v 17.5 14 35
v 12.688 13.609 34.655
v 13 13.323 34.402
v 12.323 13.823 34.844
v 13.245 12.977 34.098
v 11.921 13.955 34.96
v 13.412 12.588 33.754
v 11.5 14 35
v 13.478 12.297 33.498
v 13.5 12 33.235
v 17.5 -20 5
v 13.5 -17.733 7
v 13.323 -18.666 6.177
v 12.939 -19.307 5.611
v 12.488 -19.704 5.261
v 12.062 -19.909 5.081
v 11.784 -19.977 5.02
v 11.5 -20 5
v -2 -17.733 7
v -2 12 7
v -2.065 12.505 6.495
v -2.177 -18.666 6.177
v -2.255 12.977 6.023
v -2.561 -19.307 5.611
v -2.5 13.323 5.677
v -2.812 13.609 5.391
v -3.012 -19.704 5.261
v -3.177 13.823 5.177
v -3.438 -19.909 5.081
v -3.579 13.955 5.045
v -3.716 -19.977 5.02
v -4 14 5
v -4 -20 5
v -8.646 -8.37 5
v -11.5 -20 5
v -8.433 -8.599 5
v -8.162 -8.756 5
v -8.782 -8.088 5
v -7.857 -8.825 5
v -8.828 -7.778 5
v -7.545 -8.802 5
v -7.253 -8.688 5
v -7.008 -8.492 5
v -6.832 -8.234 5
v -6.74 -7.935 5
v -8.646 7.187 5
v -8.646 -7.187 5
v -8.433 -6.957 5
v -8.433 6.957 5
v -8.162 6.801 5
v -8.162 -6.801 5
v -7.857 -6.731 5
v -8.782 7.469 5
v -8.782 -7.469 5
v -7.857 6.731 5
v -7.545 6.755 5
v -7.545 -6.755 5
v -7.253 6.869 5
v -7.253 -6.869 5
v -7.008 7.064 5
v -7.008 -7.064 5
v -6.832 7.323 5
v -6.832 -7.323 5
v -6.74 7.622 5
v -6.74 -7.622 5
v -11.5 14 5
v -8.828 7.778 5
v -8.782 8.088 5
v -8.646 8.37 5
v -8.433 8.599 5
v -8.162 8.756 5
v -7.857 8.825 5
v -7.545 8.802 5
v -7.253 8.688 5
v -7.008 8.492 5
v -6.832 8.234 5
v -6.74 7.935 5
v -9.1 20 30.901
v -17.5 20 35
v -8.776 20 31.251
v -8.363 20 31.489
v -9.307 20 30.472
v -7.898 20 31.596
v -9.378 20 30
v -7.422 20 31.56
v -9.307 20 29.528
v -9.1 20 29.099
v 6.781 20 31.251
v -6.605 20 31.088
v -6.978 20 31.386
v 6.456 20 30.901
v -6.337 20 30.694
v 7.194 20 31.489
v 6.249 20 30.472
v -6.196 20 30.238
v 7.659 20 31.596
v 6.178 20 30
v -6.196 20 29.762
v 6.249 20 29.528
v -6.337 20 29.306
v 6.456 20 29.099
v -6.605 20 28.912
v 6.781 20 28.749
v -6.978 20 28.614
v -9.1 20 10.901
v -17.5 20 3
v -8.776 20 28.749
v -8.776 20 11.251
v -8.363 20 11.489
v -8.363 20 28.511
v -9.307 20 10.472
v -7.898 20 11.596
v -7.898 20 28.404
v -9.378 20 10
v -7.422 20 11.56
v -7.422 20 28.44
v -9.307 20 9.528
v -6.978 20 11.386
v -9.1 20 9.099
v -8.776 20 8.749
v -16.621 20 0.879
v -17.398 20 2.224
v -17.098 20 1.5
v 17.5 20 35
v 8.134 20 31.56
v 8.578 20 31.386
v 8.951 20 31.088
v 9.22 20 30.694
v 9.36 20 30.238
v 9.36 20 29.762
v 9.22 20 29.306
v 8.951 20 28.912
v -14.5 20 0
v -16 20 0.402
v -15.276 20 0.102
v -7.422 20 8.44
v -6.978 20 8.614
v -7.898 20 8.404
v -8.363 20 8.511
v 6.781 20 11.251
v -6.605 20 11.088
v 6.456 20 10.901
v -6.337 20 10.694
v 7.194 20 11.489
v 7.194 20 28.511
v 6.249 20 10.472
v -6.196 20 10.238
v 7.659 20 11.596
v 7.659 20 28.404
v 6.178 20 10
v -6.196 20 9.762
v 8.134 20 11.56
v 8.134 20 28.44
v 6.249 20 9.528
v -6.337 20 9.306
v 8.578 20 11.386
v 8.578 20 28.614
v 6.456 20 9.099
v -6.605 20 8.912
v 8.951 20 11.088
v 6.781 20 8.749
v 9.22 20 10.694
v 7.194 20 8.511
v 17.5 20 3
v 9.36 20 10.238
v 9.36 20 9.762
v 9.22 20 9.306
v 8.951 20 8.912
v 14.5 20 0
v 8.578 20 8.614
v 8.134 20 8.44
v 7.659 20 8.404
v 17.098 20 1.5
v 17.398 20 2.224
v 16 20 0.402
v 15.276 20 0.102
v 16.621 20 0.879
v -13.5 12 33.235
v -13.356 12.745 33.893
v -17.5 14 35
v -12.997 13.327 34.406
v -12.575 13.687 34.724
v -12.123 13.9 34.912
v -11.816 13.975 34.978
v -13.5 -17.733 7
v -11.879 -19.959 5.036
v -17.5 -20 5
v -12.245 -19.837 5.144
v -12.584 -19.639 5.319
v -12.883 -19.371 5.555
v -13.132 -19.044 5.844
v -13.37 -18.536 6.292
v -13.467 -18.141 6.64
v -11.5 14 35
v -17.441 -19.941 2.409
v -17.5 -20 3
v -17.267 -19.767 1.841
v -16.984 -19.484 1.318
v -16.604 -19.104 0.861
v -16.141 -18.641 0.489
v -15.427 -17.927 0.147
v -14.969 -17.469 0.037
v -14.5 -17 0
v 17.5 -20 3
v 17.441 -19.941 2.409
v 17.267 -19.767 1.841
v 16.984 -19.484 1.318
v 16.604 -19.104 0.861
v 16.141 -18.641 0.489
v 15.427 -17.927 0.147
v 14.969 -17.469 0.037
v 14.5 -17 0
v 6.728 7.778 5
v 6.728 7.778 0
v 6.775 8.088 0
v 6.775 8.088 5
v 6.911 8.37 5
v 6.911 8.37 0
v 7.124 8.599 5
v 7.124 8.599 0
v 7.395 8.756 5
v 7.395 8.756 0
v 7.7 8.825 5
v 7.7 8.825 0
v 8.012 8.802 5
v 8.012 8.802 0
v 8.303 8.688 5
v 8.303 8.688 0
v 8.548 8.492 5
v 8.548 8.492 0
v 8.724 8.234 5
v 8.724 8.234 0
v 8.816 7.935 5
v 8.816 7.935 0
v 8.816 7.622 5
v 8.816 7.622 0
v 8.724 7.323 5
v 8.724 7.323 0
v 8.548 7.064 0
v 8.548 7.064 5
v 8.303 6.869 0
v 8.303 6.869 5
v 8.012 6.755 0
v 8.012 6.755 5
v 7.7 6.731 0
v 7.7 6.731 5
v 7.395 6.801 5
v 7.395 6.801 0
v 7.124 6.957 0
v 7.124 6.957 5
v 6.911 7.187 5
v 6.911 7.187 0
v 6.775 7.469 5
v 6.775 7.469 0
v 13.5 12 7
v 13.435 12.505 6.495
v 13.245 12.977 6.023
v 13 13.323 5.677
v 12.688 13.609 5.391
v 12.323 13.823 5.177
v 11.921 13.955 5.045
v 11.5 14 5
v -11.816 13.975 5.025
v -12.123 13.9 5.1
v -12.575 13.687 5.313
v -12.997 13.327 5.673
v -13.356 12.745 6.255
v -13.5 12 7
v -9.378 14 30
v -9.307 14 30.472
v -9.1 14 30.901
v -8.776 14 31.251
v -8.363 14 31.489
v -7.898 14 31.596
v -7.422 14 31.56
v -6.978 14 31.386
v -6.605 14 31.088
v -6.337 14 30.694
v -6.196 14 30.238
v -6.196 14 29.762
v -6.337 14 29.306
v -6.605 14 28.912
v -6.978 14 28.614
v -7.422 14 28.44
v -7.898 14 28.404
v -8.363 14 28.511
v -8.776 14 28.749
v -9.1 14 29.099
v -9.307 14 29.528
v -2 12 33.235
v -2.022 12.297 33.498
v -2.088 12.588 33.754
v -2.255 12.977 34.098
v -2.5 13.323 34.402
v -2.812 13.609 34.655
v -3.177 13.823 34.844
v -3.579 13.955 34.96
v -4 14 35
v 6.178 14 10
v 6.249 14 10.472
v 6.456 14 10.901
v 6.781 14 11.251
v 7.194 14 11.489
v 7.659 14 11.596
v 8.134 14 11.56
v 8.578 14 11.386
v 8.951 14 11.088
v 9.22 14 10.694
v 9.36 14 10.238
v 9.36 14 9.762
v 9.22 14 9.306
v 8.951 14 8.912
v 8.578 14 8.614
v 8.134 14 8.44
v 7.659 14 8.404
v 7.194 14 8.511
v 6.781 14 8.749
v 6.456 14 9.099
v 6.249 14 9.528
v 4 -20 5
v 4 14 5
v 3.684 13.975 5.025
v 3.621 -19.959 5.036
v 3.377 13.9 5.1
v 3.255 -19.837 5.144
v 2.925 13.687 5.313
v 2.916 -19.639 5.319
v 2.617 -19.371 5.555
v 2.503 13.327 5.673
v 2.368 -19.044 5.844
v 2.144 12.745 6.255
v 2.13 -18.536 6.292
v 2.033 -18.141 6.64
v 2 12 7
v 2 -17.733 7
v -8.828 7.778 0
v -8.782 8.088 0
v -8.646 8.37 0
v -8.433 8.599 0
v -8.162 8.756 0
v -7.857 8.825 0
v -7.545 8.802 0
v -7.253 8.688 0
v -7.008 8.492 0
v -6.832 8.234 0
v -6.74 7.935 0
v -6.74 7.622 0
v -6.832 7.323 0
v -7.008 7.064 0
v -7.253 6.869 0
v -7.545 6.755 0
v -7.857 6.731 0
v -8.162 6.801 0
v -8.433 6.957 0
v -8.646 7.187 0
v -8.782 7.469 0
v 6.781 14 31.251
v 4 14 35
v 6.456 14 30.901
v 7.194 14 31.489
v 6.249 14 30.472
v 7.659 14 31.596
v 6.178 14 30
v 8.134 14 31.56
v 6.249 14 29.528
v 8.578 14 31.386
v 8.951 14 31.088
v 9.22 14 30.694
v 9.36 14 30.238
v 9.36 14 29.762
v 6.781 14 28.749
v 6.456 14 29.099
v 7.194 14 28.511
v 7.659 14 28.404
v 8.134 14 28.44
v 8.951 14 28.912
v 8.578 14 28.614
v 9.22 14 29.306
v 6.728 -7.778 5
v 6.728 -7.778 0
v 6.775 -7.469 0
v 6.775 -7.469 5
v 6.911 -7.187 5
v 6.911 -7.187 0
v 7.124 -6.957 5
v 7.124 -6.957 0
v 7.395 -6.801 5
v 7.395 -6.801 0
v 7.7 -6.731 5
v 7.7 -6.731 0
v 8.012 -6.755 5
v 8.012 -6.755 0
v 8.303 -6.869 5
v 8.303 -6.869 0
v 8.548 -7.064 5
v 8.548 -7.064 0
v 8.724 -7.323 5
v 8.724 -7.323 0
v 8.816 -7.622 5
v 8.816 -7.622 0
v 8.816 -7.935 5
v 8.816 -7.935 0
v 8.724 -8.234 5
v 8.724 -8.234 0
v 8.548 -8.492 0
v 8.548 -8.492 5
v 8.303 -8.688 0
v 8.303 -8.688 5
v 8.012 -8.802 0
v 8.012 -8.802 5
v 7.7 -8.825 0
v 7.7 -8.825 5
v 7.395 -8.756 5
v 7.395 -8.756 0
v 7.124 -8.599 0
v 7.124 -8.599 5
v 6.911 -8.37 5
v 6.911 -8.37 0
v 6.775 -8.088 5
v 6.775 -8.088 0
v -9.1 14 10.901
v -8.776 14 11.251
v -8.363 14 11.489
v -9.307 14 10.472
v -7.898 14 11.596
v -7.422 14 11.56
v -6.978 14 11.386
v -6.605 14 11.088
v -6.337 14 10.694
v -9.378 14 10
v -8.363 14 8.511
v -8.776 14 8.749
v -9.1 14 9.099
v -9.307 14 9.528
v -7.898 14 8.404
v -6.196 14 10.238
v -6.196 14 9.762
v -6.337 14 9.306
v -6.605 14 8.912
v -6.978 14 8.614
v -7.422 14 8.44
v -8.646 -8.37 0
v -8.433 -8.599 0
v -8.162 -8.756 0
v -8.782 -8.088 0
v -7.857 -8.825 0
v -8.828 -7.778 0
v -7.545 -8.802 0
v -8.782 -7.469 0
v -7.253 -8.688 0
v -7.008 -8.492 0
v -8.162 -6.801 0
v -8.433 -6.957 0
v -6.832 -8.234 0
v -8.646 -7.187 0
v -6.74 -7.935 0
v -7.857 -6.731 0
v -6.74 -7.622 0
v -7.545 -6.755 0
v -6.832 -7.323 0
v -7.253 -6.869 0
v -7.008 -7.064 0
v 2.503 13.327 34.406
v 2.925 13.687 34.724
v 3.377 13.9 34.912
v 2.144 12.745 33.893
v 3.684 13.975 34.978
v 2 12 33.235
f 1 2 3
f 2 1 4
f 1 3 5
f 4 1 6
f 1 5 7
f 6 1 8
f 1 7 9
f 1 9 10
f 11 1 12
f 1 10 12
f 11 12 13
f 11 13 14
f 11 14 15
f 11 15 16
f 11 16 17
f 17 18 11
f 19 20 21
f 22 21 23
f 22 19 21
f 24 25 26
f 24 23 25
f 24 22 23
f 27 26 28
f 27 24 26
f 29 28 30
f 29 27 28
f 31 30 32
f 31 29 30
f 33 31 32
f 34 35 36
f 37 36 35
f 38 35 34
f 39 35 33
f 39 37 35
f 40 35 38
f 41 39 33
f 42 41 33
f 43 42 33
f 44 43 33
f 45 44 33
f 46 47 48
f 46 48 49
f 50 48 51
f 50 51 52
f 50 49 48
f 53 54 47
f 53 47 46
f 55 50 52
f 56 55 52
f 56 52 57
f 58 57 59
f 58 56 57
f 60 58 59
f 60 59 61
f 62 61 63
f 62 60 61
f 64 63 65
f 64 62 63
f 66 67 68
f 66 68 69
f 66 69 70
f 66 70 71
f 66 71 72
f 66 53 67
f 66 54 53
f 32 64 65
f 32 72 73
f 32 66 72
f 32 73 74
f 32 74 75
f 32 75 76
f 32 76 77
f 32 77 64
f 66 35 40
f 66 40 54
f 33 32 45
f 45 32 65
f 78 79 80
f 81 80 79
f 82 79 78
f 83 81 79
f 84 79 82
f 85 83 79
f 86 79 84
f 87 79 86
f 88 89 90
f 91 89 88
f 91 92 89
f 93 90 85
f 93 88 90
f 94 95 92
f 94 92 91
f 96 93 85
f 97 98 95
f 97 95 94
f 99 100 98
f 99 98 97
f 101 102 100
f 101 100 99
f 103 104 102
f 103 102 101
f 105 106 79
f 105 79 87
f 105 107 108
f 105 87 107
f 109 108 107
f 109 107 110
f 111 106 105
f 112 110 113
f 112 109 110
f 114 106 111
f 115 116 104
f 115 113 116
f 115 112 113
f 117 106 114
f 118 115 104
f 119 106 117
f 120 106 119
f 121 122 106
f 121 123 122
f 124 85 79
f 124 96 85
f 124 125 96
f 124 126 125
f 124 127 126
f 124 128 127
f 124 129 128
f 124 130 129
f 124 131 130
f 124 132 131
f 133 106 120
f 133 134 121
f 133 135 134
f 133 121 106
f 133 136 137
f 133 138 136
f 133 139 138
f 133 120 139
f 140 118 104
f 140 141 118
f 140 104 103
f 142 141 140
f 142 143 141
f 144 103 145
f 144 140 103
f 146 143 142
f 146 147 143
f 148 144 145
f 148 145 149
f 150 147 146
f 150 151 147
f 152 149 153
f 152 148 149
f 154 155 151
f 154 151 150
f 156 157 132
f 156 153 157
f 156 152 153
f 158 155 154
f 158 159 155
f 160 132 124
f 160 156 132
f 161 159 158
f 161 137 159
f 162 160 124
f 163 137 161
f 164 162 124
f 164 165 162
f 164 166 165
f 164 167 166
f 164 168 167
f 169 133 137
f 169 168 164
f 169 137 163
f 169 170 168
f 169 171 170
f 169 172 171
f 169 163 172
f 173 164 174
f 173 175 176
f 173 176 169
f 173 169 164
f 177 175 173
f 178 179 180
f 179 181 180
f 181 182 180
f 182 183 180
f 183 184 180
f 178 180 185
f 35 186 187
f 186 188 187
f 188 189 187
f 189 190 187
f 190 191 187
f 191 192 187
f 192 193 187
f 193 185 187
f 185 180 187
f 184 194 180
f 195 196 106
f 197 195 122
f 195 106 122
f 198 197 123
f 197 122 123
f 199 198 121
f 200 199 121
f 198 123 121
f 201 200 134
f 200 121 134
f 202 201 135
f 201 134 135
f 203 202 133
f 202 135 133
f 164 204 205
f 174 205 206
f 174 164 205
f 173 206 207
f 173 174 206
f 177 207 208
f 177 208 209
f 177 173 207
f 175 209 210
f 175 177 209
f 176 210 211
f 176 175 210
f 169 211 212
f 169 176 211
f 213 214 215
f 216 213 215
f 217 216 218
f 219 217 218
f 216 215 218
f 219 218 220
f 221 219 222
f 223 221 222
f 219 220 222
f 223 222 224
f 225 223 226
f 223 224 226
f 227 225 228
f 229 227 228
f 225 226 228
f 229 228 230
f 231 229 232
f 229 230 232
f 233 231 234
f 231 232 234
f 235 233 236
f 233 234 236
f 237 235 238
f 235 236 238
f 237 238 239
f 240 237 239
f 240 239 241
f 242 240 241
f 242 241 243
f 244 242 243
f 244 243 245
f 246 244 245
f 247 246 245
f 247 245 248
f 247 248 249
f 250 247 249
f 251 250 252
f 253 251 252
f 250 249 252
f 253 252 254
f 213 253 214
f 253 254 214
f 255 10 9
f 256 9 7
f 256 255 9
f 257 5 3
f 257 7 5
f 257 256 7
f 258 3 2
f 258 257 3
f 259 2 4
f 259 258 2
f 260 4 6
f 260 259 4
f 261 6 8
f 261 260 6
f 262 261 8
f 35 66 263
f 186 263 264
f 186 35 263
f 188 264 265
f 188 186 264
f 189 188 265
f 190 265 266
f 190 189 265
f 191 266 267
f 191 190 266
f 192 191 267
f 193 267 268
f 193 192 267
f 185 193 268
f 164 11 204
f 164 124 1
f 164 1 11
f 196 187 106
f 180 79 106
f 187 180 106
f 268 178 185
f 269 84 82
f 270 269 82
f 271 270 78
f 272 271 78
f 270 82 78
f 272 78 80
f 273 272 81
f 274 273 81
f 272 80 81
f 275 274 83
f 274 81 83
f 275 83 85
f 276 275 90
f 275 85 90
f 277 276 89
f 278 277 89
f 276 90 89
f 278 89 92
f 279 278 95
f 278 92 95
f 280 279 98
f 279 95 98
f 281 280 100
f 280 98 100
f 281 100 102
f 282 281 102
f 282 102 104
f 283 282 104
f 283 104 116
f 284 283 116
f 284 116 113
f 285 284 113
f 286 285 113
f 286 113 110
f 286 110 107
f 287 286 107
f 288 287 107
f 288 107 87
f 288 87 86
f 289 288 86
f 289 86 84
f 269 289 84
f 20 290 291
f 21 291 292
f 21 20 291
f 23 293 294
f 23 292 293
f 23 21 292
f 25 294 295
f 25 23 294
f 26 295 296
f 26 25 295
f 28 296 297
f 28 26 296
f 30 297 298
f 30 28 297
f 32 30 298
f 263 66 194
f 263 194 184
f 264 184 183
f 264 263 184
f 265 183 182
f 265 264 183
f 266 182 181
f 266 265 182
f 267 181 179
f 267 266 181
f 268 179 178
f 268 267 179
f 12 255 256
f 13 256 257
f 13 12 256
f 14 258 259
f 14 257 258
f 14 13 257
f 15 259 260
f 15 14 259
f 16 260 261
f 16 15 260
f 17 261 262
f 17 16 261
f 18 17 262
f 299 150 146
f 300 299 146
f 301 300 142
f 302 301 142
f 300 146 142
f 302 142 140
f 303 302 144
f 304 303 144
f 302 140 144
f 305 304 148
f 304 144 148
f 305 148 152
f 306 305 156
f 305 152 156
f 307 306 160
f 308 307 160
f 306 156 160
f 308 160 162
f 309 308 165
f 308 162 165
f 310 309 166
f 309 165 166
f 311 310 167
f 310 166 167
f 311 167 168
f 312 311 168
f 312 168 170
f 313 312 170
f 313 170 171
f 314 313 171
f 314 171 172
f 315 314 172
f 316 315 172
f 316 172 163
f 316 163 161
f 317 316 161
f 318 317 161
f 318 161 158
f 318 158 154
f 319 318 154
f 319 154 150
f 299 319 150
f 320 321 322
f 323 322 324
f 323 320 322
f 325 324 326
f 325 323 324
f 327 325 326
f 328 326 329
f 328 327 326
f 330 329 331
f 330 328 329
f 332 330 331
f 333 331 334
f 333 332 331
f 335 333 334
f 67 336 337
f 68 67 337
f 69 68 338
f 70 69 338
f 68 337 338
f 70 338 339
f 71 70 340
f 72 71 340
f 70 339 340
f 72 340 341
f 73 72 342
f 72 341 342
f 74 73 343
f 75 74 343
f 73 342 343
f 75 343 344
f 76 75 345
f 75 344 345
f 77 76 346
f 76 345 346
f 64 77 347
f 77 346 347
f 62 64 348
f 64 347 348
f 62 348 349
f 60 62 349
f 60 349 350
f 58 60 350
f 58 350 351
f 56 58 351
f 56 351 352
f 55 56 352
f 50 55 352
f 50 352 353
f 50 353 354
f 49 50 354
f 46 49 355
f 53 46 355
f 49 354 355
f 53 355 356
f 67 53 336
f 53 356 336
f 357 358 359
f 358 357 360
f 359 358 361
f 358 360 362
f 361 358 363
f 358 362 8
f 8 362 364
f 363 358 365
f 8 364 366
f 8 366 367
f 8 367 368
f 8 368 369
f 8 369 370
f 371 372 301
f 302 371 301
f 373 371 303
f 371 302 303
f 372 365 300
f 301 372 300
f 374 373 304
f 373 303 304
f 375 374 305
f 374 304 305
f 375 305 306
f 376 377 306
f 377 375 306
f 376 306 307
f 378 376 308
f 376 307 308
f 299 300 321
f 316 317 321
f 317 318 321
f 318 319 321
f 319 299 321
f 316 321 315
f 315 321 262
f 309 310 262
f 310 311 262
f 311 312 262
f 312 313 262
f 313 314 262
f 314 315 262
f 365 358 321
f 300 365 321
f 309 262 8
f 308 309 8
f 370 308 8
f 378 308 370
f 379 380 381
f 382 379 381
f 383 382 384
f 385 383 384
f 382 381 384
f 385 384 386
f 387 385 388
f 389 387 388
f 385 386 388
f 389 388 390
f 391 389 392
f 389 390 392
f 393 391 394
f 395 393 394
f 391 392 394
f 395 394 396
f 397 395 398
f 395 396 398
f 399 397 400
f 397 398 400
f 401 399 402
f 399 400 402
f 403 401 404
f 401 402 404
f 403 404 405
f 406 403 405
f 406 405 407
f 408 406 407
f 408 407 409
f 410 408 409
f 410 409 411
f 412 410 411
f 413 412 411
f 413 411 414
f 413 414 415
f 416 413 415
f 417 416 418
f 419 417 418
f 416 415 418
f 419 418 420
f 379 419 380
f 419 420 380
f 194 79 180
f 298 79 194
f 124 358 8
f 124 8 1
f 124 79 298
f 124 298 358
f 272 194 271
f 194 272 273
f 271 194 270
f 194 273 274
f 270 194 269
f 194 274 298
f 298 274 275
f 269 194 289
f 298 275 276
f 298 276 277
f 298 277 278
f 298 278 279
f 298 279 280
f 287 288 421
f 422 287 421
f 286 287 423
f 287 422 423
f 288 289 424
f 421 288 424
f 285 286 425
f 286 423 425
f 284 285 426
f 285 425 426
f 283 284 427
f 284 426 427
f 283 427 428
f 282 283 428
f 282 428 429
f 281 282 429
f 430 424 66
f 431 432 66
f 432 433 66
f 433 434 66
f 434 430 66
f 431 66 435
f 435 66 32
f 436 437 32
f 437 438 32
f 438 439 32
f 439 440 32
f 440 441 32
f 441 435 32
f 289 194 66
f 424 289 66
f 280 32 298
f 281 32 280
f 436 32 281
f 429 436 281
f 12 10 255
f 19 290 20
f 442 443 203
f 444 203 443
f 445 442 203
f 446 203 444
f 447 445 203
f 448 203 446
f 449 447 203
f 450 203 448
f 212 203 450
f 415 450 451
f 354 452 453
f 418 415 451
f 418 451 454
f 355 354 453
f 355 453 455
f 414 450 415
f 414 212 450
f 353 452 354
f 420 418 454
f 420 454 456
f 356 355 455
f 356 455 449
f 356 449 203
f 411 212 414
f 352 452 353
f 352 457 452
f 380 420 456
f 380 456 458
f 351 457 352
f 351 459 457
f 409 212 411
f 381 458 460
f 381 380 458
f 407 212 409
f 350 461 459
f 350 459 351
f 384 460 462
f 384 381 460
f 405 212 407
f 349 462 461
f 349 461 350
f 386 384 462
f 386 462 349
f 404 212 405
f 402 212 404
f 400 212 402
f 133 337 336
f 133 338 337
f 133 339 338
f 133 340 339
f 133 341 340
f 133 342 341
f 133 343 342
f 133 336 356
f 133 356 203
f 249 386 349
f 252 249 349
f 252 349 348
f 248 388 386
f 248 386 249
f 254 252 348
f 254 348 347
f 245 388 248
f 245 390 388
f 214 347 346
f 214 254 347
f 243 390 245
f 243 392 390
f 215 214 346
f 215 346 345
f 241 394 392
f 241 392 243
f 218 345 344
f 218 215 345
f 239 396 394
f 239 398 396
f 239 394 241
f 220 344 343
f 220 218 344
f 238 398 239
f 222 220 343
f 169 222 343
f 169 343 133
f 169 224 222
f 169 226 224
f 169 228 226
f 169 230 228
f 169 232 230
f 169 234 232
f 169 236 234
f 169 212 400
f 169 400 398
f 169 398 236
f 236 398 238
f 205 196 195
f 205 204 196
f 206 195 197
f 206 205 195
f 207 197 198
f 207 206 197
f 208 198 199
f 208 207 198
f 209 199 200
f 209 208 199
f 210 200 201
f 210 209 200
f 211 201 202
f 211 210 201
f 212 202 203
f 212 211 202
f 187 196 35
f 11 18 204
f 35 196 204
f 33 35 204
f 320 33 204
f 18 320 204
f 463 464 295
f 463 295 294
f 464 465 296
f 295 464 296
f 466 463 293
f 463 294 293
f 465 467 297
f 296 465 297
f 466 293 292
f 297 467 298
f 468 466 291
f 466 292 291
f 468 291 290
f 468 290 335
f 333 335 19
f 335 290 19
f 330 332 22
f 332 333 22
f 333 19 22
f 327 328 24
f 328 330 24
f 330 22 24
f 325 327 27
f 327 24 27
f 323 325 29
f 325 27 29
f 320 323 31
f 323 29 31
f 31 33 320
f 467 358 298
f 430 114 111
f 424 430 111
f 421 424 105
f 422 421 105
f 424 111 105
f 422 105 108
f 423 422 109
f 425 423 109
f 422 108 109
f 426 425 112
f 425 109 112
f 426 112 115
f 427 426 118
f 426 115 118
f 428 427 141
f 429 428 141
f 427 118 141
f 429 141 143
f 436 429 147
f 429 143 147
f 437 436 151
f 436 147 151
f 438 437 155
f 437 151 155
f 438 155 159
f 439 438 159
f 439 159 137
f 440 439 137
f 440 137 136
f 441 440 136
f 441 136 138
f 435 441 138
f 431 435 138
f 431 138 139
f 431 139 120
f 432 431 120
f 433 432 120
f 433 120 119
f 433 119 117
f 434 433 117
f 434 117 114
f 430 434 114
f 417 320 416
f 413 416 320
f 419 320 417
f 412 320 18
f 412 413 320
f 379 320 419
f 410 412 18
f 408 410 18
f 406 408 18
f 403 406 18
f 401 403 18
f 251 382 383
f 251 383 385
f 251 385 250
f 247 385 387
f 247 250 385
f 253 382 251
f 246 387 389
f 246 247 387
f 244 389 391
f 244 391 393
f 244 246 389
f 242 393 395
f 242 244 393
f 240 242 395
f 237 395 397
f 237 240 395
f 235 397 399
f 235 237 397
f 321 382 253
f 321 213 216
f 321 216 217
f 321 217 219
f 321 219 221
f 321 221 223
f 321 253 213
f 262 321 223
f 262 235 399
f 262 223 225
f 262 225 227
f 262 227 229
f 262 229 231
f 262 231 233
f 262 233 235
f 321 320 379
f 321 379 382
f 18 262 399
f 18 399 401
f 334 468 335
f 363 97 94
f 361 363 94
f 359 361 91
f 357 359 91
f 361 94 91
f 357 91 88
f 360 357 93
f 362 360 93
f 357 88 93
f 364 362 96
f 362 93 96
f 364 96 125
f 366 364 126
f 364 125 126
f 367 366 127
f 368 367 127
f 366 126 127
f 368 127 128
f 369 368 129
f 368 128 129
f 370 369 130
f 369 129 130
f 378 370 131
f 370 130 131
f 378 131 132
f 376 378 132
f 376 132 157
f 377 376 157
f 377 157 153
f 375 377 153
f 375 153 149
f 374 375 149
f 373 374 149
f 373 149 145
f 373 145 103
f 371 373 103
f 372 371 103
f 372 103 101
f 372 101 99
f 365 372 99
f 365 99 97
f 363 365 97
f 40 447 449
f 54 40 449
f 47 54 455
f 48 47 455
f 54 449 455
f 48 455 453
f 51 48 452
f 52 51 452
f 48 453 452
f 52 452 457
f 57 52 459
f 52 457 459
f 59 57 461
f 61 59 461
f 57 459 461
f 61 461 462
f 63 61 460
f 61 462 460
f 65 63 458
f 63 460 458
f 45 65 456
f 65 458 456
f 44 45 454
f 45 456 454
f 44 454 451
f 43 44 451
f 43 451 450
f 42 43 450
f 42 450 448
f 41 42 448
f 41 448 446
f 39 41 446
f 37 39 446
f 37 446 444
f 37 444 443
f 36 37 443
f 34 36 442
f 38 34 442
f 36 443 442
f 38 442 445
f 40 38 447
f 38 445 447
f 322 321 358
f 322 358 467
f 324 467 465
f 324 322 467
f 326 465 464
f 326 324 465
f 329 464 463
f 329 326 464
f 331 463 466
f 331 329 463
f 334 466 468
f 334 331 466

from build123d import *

# Parameters (mm, degrees)
SKETCH3_W                = 35
SKETCH3_H                = 40
BOSS_EXTRUDE1_DEPTH      = 5
SKETCH5_W                = 35
SKETCH5_H                = 30
BOSS_EXTRUDE2_DEPTH      = 6
BOSS_EXTRUDE3_DEPTH      = 4
BOSS_EXTRUDE4_DEPTH      = 2
BOSS_EXTRUDE4_DEPTH_BACK = 2
SKETCH9_R                = 1.05
CUT_EXTRUDE1_DEPTH       = 5
SKETCH10_R               = 1.6
CUT_EXTRUDE2_DEPTH       = 56.957573214
FILLET1_R                = 3
FILLET2_R                = 2


with BuildPart() as part:
    # Sketch3 → Boss-Extrude1 (new body)
    with BuildSketch(Plane.XY):
        Rectangle(SKETCH3_W, SKETCH3_H)
    extrude(amount=BOSS_EXTRUDE1_DEPTH)

    # Sketch5 → Boss-Extrude2 (add)
    with BuildSketch(Plane(origin=(0, 20, 0), x_dir=(1, 0, 0), z_dir=(0, 1, 0))):
        with Locations((0, -20)):
            Rectangle(SKETCH5_W, SKETCH5_H)
    extrude(amount=-BOSS_EXTRUDE2_DEPTH)

    # Sketch7 → Boss-Extrude3 (add)
    with BuildSketch(Plane(origin=(17.5, 0, 0), x_dir=(0, 0, -1), z_dir=(1, 0, 0))):
        Polygon((-35, 14), (-5, -20), (-5, 14), align=None)
    boss_extrude3 = extrude(amount=-BOSS_EXTRUDE3_DEPTH)

    # Mirror1: Boss-Extrude3 across plane
    add(boss_extrude3.mirror(Plane(origin=(0, 0, 0), x_dir=(0, 0, 1), z_dir=(1, 0, 0))))

    # Sketch8 → Boss-Extrude4 (add, two sides: drawn at the far end of the back side and taken through both)
    with BuildSketch(Plane(origin=(0, 0, 0), x_dir=(0, 0, -1), z_dir=(1, 0, 0)).offset(-BOSS_EXTRUDE4_DEPTH_BACK)):
        Polygon((-35, 14), (-5, -20), (-5, 14), align=None)
    extrude(amount=BOSS_EXTRUDE4_DEPTH + BOSS_EXTRUDE4_DEPTH_BACK)

    # Sketch9 → Cut-Extrude1 (cut)
    with BuildSketch(Plane(origin=(0, 0, 0), x_dir=(-1, 0, 0), z_dir=(0, 0, -1))):
        with Locations((-7.778174593, 7.778174593)):
            Circle(SKETCH9_R)
        with Locations((7.778174593, 7.778174593)):
            Circle(SKETCH9_R)
        with Locations((7.778174593, -7.778174593)):
            Circle(SKETCH9_R)
        with Locations((-7.778174593, -7.778174593)):
            Circle(SKETCH9_R)
    extrude(amount=-CUT_EXTRUDE1_DEPTH, mode=Mode.SUBTRACT)

    # Sketch10 → Cut-Extrude2 (cut, through all)
    with BuildSketch(Plane(origin=(0, 20, 0), x_dir=(1, 0, 0), z_dir=(0, 1, 0))):
        with Locations(Location((-7.778174593, -10, 0), (0, 0, 180))):
            Circle(SKETCH10_R)
        with Locations(Location((-7.778174593, -30, 0), (0, 0, 180))):
            Circle(SKETCH10_R)
        with Locations(Location((7.778174593, -30, 0), (0, 0, 180))):
            Circle(SKETCH10_R)
        with Locations(Location((7.778174593, -10, 0), (0, 0, 180))):
            Circle(SKETCH10_R)
    extrude(amount=-CUT_EXTRUDE2_DEPTH, mode=Mode.SUBTRACT)

    # Fillet1
    fillet1_edges = [part.edges().sort_by_distance(p)[0] for p in [
        (0, -20, 0),
        (-17.5, 0, 0),
        (17.5, 0, 0),
    ]]
    fillet(fillet1_edges, radius=FILLET1_R)

    # Fillet2
    # the kernel refuses this fillet: 2 mm, written as the material it adds along each edge
    with BuildSketch(Plane(origin=(13.5, 14, 0), x_dir=(0, -1, 0), z_dir=(0, 0, 1))) as fillet2_piece_1_section:
        with BuildLine():
            CenterArc((FILLET2_R, -FILLET2_R), FILLET2_R, 90, 90)
            Line((0, -FILLET2_R), (0, 0))
            Line((0, 0), (FILLET2_R, 0))
        make_face()
    fillet2_piece_1 = extrude(amount=35, mode=Mode.PRIVATE)
    fillet2_piece_1 = split(fillet2_piece_1, bisect_by=Plane(origin=(13.047209771, -2.378125245, 20.548713019), z_dir=(0, 0.6616216370868465, -0.7498378553650924)), keep=Keep.TOP, mode=Mode.PRIVATE)
    add(fillet2_piece_1)
    with BuildSketch(Plane(origin=(13.5, -20, 5), x_dir=(-1, 0, 0), z_dir=(0, 1, 0))) as fillet2_piece_2_section:
        with BuildLine():
            CenterArc((FILLET2_R, FILLET2_R), FILLET2_R, 180, 90)
            Line((0, FILLET2_R), (0, 0))
            Line((0, 0), (FILLET2_R, 0))
        make_face()
    fillet2_piece_2 = extrude(amount=39, mode=Mode.PRIVATE)
    fillet2_piece_2 = split(fillet2_piece_2, bisect_by=Plane(origin=(13.043521125, -10.077324079, 13.755302283), z_dir=(0, 0.6616216370868465, -0.7498378553650924)), keep=Keep.TOP, mode=Mode.PRIVATE)
    add(fillet2_piece_2)
    with BuildSketch(Plane(origin=(-13.5, 14, 0), x_dir=(0, -1, 0), z_dir=(0, 0, 1))) as fillet2_piece_3_section:
        with BuildLine():
            CenterArc((FILLET2_R, FILLET2_R), FILLET2_R, 180, 90)
            Line((0, FILLET2_R), (0, 0))
            Line((0, 0), (FILLET2_R, 0))
        make_face()
    fillet2_piece_3 = extrude(amount=35, mode=Mode.PRIVATE)
    fillet2_piece_3 = split(fillet2_piece_3, bisect_by=Plane(origin=(-13.047209771, -2.378125245, 20.548713019), z_dir=(0, 0.6616216370868465, -0.7498378553650924)), keep=Keep.TOP, mode=Mode.PRIVATE)
    add(fillet2_piece_3)
    with BuildSketch(Plane(origin=(-13.5, -20, 5), x_dir=(1, 0, 0), z_dir=(0, 1, 0))) as fillet2_piece_4_section:
        with BuildLine():
            CenterArc((FILLET2_R, -FILLET2_R), FILLET2_R, 90, 90)
            Line((0, -FILLET2_R), (0, 0))
            Line((0, 0), (FILLET2_R, 0))
        make_face()
    fillet2_piece_4 = extrude(amount=39, mode=Mode.PRIVATE)
    fillet2_piece_4 = split(fillet2_piece_4, bisect_by=Plane(origin=(-13.043521125, -10.077324079, 13.755302283), z_dir=(0, 0.6616216370868465, -0.7498378553650924)), keep=Keep.TOP, mode=Mode.PRIVATE)
    add(fillet2_piece_4)
    with BuildSketch(Plane(origin=(-2, 14, 0), x_dir=(-1, 0, 0), z_dir=(0, 0, 1))) as fillet2_piece_5_section:
        with BuildLine():
            CenterArc((FILLET2_R, FILLET2_R), FILLET2_R, 180, 90)
            Line((0, FILLET2_R), (0, 0))
            Line((0, 0), (FILLET2_R, 0))
        make_face()
    fillet2_piece_5 = extrude(amount=35, mode=Mode.PRIVATE)
    fillet2_piece_5 = split(fillet2_piece_5, bisect_by=Plane(origin=(-2.452790229, -2.378125245, 20.548713019), z_dir=(0, 0.6616216370868465, -0.7498378553650924)), keep=Keep.TOP, mode=Mode.PRIVATE)
    add(fillet2_piece_5)
    with BuildSketch(Plane(origin=(-2, -20, 5), x_dir=(-1, 0, 0), z_dir=(0, 1, 0))) as fillet2_piece_6_section:
        with BuildLine():
            CenterArc((FILLET2_R, FILLET2_R), FILLET2_R, 180, 90)
            Line((0, FILLET2_R), (0, 0))
            Line((0, 0), (FILLET2_R, 0))
        make_face()
    fillet2_piece_6 = extrude(amount=39, mode=Mode.PRIVATE)
    fillet2_piece_6 = split(fillet2_piece_6, bisect_by=Plane(origin=(-2.456478875, -10.077324079, 13.755302283), z_dir=(0, 0.6616216370868465, -0.7498378553650924)), keep=Keep.TOP, mode=Mode.PRIVATE)
    add(fillet2_piece_6)
    with BuildSketch(Plane(origin=(2, 14, 0), x_dir=(0, -1, 0), z_dir=(0, 0, 1))) as fillet2_piece_7_section:
        with BuildLine():
            CenterArc((FILLET2_R, FILLET2_R), FILLET2_R, 180, 90)
            Line((0, FILLET2_R), (0, 0))
            Line((0, 0), (FILLET2_R, 0))
        make_face()
    fillet2_piece_7 = extrude(amount=35, mode=Mode.PRIVATE)
    fillet2_piece_7 = split(fillet2_piece_7, bisect_by=Plane(origin=(2.452790229, -2.378125245, 20.548713019), z_dir=(0, 0.6616216370868465, -0.7498378553650924)), keep=Keep.TOP, mode=Mode.PRIVATE)
    add(fillet2_piece_7)
    with BuildSketch(Plane(origin=(2, -20, 5), x_dir=(1, 0, 0), z_dir=(0, 1, 0))) as fillet2_piece_8_section:
        with BuildLine():
            CenterArc((FILLET2_R, -FILLET2_R), FILLET2_R, 90, 90)
            Line((0, -FILLET2_R), (0, 0))
            Line((0, 0), (FILLET2_R, 0))
        make_face()
    fillet2_piece_8 = extrude(amount=39, mode=Mode.PRIVATE)
    fillet2_piece_8 = split(fillet2_piece_8, bisect_by=Plane(origin=(2.456478875, -10.077324079, 13.755302283), z_dir=(0, 0.6616216370868465, -0.7498378553650924)), keep=Keep.TOP, mode=Mode.PRIVATE)
    add(fillet2_piece_8)


solid = part.part
